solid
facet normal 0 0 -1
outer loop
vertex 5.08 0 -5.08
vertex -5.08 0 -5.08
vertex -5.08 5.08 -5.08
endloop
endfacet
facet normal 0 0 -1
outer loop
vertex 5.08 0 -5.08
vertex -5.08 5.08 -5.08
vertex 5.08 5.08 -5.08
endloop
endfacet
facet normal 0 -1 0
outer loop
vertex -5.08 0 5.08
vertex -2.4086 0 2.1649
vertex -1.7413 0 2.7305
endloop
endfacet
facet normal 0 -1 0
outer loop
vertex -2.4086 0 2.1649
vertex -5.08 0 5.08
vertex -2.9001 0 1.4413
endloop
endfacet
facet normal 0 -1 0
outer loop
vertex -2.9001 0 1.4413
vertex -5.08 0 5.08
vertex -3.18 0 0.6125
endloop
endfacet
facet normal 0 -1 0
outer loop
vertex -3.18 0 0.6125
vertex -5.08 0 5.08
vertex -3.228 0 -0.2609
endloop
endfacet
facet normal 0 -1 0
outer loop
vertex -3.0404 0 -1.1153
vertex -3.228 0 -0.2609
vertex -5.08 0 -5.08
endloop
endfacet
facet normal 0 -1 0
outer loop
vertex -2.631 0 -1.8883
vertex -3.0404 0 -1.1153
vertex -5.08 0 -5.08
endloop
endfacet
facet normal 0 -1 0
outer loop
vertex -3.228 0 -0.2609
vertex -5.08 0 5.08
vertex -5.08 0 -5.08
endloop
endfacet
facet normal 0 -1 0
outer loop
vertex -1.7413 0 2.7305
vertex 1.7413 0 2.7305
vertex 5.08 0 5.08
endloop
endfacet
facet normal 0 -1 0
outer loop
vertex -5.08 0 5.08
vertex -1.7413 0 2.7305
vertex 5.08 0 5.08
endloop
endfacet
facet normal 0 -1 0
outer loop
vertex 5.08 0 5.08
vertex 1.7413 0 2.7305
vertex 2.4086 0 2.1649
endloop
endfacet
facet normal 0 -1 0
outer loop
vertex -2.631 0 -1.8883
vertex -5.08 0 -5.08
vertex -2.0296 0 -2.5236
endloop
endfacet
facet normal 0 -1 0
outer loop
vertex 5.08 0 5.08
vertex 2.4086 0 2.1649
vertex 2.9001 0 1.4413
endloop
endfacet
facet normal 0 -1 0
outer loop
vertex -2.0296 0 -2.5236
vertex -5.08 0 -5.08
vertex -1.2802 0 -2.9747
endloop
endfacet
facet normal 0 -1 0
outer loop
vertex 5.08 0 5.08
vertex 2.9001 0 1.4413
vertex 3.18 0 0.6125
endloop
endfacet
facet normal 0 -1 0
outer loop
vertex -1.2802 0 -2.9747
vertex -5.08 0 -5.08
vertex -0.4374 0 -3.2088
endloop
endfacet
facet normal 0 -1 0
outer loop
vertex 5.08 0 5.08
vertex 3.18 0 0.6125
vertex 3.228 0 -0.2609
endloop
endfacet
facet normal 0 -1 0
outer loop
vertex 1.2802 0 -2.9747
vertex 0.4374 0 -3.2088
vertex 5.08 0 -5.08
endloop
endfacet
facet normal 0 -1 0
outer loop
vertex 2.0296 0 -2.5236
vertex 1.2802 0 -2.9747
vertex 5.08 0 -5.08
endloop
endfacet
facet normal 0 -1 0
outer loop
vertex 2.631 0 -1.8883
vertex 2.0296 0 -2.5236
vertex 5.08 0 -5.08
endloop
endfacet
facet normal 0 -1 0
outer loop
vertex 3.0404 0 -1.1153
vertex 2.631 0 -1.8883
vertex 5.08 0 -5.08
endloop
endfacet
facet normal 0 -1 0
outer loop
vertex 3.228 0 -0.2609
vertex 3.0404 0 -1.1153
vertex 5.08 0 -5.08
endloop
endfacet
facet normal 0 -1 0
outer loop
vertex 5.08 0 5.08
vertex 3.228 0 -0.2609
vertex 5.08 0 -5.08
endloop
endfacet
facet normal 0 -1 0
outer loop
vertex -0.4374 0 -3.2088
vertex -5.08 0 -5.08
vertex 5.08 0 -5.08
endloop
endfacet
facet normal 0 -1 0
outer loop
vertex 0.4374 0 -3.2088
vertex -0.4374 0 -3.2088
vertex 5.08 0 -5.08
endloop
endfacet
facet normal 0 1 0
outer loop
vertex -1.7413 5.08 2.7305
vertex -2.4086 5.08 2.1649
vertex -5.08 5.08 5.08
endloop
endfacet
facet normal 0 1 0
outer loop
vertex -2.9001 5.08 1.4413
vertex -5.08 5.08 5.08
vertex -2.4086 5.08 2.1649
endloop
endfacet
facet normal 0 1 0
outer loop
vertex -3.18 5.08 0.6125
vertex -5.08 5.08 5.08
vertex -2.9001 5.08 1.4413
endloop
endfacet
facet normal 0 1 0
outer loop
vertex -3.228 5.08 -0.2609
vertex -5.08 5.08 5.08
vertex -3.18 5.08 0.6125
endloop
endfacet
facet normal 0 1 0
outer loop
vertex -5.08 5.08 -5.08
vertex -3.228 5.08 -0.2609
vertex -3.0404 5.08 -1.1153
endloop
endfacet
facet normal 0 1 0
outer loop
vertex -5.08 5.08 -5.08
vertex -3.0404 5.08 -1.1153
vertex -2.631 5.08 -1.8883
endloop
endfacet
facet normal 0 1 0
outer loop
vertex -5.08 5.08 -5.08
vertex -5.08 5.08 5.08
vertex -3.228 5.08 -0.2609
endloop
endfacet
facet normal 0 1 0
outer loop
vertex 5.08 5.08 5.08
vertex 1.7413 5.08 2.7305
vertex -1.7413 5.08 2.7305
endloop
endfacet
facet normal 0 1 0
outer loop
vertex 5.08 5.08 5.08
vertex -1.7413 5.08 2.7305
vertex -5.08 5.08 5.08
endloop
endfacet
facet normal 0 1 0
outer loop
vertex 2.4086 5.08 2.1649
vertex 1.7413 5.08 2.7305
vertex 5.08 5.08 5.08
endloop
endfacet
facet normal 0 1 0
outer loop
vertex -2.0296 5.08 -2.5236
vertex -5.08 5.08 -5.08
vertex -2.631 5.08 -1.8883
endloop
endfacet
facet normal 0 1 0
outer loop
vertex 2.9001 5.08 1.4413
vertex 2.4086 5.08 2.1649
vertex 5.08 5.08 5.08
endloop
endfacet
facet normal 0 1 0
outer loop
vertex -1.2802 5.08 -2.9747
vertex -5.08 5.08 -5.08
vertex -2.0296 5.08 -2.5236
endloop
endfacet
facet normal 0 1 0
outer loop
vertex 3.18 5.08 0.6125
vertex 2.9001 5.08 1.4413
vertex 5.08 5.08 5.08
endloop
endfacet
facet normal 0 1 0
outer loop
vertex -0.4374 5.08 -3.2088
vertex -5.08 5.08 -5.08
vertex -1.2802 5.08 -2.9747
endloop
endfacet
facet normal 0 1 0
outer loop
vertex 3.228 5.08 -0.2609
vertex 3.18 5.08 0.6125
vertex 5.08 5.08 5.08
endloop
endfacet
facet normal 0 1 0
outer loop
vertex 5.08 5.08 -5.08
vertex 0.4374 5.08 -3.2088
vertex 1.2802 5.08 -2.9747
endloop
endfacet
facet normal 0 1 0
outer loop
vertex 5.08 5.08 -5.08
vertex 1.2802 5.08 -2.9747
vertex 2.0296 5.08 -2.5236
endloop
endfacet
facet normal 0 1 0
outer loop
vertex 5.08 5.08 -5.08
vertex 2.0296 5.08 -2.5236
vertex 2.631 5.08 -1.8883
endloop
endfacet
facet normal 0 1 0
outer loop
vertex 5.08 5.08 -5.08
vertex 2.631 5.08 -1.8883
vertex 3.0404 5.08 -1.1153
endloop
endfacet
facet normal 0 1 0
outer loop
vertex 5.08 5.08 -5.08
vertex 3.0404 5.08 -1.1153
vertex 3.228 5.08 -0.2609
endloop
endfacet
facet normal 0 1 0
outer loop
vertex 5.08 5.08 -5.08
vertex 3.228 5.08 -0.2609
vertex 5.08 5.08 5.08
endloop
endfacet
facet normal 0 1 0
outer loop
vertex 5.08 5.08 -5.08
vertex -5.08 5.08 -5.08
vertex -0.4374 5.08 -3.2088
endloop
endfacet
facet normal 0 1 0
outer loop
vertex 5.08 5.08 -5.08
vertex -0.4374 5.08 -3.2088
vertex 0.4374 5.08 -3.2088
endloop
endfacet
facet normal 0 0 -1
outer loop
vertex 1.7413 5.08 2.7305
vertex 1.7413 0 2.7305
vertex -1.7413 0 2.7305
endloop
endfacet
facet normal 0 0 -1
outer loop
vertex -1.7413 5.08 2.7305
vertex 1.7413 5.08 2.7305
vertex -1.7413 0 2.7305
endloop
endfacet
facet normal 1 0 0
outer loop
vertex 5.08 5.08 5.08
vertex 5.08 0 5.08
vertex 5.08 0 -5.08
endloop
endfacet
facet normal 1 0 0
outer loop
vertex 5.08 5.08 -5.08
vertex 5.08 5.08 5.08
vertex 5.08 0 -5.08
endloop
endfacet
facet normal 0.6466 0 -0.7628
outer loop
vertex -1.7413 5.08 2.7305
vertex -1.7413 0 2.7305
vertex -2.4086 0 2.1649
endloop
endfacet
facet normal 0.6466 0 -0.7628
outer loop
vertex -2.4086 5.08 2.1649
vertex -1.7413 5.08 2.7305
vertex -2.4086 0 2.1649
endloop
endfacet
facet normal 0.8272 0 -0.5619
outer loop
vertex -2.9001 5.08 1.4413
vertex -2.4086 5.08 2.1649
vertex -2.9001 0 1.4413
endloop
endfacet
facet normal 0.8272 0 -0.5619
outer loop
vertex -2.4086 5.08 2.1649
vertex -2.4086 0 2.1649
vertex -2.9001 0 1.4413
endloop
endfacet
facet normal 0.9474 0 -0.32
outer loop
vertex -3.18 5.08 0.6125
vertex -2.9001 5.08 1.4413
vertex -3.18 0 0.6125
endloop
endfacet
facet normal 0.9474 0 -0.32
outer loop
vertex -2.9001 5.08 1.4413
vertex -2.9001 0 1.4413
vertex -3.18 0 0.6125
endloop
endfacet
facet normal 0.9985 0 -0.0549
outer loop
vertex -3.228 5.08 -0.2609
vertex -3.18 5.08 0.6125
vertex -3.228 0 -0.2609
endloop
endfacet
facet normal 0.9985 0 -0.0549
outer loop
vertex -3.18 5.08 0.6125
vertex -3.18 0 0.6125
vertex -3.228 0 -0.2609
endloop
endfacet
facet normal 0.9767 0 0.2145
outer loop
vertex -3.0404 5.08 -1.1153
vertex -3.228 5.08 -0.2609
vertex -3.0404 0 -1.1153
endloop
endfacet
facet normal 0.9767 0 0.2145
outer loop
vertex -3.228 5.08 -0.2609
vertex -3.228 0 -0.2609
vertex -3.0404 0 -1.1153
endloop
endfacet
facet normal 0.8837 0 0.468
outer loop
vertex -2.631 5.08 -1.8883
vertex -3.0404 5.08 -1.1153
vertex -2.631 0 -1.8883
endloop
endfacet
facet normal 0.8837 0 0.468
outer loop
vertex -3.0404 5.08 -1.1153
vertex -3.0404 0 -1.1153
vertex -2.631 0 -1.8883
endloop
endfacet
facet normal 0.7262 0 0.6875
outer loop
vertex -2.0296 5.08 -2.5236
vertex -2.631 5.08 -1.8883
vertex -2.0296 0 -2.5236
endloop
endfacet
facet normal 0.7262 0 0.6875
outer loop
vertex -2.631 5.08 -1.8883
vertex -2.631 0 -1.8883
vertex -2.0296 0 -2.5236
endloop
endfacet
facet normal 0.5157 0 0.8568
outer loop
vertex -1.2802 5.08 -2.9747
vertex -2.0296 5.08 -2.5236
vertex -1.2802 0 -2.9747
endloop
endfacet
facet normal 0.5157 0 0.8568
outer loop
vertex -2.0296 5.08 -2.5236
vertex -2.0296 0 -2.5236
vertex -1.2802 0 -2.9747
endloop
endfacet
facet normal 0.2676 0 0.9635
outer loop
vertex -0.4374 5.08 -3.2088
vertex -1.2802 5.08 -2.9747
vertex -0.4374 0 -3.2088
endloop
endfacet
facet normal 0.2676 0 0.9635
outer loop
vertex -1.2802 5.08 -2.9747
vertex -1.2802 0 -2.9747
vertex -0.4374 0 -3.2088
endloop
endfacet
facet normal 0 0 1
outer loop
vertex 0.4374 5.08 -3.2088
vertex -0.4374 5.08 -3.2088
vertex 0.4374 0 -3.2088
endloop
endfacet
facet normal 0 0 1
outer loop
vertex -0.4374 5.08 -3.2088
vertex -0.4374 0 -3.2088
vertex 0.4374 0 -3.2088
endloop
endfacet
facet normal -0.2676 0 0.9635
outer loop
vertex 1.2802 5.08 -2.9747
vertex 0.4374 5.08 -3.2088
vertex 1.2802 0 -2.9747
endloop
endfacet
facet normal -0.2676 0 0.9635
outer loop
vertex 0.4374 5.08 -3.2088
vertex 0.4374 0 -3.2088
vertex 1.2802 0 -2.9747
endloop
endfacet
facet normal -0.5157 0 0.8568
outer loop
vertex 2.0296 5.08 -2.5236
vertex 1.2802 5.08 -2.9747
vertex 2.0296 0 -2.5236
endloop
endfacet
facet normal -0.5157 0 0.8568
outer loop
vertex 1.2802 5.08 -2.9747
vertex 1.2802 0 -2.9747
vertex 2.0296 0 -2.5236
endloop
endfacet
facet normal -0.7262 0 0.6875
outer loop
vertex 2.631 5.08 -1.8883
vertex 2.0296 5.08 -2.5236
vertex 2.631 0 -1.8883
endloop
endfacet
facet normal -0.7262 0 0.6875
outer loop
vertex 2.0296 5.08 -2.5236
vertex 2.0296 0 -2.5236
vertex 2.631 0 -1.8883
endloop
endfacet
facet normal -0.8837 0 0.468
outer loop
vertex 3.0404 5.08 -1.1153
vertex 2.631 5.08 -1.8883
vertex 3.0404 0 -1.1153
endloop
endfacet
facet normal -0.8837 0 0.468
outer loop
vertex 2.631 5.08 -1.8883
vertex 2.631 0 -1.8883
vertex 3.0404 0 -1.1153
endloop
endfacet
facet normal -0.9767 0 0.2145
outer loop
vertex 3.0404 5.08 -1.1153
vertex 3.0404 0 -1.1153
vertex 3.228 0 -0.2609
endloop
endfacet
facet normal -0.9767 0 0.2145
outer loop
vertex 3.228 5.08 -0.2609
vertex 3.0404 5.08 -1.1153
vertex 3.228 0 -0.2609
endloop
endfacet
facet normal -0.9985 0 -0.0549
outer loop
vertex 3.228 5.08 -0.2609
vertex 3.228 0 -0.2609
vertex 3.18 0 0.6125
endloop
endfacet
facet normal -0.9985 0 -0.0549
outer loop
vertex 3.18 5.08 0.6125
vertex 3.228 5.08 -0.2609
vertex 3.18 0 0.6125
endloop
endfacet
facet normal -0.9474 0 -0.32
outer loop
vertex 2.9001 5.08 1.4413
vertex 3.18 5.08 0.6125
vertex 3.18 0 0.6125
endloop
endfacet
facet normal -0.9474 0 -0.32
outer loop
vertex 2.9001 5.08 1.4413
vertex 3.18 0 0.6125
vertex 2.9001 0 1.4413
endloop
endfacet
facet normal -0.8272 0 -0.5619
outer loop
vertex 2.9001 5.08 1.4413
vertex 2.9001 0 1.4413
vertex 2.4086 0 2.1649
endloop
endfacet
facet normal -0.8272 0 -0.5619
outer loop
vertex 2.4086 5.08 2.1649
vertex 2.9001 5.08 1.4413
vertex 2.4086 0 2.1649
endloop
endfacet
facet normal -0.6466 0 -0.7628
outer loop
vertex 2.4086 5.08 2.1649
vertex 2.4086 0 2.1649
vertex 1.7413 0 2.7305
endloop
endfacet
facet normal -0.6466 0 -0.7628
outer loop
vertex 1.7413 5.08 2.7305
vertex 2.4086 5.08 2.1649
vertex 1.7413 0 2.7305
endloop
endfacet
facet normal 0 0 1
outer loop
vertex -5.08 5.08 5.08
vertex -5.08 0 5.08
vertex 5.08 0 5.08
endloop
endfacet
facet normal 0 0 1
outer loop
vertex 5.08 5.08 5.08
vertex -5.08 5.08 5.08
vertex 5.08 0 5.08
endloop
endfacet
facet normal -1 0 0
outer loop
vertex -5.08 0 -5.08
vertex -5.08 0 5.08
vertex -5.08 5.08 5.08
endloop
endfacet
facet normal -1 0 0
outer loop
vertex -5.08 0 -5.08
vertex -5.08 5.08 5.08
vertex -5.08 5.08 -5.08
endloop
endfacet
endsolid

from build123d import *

# Parameters (mm, degrees)
SKETCH1_W           = 10.16
SKETCH1_H           = 10.16
BOSS_EXTRUDE1_DEPTH = 5.08


with BuildPart() as part:
    # Sketch1 → Boss-Extrude1 (new body)
    with BuildSketch(Plane(origin=(0, 0, 0), x_dir=(1, 0, 0), z_dir=(0, 1, 0))):
        Rectangle(SKETCH1_W, SKETCH1_H)
        with BuildLine():
            Line((1.741336269, -2.7305), (-1.741336269, -2.7305))
            ThreePointArc((-1.741336269, -2.7305), (0, 3.2385), (1.741336269, -2.7305))
        make_face(mode=Mode.SUBTRACT)
    extrude(amount=BOSS_EXTRUDE1_DEPTH)


solid = part.part
